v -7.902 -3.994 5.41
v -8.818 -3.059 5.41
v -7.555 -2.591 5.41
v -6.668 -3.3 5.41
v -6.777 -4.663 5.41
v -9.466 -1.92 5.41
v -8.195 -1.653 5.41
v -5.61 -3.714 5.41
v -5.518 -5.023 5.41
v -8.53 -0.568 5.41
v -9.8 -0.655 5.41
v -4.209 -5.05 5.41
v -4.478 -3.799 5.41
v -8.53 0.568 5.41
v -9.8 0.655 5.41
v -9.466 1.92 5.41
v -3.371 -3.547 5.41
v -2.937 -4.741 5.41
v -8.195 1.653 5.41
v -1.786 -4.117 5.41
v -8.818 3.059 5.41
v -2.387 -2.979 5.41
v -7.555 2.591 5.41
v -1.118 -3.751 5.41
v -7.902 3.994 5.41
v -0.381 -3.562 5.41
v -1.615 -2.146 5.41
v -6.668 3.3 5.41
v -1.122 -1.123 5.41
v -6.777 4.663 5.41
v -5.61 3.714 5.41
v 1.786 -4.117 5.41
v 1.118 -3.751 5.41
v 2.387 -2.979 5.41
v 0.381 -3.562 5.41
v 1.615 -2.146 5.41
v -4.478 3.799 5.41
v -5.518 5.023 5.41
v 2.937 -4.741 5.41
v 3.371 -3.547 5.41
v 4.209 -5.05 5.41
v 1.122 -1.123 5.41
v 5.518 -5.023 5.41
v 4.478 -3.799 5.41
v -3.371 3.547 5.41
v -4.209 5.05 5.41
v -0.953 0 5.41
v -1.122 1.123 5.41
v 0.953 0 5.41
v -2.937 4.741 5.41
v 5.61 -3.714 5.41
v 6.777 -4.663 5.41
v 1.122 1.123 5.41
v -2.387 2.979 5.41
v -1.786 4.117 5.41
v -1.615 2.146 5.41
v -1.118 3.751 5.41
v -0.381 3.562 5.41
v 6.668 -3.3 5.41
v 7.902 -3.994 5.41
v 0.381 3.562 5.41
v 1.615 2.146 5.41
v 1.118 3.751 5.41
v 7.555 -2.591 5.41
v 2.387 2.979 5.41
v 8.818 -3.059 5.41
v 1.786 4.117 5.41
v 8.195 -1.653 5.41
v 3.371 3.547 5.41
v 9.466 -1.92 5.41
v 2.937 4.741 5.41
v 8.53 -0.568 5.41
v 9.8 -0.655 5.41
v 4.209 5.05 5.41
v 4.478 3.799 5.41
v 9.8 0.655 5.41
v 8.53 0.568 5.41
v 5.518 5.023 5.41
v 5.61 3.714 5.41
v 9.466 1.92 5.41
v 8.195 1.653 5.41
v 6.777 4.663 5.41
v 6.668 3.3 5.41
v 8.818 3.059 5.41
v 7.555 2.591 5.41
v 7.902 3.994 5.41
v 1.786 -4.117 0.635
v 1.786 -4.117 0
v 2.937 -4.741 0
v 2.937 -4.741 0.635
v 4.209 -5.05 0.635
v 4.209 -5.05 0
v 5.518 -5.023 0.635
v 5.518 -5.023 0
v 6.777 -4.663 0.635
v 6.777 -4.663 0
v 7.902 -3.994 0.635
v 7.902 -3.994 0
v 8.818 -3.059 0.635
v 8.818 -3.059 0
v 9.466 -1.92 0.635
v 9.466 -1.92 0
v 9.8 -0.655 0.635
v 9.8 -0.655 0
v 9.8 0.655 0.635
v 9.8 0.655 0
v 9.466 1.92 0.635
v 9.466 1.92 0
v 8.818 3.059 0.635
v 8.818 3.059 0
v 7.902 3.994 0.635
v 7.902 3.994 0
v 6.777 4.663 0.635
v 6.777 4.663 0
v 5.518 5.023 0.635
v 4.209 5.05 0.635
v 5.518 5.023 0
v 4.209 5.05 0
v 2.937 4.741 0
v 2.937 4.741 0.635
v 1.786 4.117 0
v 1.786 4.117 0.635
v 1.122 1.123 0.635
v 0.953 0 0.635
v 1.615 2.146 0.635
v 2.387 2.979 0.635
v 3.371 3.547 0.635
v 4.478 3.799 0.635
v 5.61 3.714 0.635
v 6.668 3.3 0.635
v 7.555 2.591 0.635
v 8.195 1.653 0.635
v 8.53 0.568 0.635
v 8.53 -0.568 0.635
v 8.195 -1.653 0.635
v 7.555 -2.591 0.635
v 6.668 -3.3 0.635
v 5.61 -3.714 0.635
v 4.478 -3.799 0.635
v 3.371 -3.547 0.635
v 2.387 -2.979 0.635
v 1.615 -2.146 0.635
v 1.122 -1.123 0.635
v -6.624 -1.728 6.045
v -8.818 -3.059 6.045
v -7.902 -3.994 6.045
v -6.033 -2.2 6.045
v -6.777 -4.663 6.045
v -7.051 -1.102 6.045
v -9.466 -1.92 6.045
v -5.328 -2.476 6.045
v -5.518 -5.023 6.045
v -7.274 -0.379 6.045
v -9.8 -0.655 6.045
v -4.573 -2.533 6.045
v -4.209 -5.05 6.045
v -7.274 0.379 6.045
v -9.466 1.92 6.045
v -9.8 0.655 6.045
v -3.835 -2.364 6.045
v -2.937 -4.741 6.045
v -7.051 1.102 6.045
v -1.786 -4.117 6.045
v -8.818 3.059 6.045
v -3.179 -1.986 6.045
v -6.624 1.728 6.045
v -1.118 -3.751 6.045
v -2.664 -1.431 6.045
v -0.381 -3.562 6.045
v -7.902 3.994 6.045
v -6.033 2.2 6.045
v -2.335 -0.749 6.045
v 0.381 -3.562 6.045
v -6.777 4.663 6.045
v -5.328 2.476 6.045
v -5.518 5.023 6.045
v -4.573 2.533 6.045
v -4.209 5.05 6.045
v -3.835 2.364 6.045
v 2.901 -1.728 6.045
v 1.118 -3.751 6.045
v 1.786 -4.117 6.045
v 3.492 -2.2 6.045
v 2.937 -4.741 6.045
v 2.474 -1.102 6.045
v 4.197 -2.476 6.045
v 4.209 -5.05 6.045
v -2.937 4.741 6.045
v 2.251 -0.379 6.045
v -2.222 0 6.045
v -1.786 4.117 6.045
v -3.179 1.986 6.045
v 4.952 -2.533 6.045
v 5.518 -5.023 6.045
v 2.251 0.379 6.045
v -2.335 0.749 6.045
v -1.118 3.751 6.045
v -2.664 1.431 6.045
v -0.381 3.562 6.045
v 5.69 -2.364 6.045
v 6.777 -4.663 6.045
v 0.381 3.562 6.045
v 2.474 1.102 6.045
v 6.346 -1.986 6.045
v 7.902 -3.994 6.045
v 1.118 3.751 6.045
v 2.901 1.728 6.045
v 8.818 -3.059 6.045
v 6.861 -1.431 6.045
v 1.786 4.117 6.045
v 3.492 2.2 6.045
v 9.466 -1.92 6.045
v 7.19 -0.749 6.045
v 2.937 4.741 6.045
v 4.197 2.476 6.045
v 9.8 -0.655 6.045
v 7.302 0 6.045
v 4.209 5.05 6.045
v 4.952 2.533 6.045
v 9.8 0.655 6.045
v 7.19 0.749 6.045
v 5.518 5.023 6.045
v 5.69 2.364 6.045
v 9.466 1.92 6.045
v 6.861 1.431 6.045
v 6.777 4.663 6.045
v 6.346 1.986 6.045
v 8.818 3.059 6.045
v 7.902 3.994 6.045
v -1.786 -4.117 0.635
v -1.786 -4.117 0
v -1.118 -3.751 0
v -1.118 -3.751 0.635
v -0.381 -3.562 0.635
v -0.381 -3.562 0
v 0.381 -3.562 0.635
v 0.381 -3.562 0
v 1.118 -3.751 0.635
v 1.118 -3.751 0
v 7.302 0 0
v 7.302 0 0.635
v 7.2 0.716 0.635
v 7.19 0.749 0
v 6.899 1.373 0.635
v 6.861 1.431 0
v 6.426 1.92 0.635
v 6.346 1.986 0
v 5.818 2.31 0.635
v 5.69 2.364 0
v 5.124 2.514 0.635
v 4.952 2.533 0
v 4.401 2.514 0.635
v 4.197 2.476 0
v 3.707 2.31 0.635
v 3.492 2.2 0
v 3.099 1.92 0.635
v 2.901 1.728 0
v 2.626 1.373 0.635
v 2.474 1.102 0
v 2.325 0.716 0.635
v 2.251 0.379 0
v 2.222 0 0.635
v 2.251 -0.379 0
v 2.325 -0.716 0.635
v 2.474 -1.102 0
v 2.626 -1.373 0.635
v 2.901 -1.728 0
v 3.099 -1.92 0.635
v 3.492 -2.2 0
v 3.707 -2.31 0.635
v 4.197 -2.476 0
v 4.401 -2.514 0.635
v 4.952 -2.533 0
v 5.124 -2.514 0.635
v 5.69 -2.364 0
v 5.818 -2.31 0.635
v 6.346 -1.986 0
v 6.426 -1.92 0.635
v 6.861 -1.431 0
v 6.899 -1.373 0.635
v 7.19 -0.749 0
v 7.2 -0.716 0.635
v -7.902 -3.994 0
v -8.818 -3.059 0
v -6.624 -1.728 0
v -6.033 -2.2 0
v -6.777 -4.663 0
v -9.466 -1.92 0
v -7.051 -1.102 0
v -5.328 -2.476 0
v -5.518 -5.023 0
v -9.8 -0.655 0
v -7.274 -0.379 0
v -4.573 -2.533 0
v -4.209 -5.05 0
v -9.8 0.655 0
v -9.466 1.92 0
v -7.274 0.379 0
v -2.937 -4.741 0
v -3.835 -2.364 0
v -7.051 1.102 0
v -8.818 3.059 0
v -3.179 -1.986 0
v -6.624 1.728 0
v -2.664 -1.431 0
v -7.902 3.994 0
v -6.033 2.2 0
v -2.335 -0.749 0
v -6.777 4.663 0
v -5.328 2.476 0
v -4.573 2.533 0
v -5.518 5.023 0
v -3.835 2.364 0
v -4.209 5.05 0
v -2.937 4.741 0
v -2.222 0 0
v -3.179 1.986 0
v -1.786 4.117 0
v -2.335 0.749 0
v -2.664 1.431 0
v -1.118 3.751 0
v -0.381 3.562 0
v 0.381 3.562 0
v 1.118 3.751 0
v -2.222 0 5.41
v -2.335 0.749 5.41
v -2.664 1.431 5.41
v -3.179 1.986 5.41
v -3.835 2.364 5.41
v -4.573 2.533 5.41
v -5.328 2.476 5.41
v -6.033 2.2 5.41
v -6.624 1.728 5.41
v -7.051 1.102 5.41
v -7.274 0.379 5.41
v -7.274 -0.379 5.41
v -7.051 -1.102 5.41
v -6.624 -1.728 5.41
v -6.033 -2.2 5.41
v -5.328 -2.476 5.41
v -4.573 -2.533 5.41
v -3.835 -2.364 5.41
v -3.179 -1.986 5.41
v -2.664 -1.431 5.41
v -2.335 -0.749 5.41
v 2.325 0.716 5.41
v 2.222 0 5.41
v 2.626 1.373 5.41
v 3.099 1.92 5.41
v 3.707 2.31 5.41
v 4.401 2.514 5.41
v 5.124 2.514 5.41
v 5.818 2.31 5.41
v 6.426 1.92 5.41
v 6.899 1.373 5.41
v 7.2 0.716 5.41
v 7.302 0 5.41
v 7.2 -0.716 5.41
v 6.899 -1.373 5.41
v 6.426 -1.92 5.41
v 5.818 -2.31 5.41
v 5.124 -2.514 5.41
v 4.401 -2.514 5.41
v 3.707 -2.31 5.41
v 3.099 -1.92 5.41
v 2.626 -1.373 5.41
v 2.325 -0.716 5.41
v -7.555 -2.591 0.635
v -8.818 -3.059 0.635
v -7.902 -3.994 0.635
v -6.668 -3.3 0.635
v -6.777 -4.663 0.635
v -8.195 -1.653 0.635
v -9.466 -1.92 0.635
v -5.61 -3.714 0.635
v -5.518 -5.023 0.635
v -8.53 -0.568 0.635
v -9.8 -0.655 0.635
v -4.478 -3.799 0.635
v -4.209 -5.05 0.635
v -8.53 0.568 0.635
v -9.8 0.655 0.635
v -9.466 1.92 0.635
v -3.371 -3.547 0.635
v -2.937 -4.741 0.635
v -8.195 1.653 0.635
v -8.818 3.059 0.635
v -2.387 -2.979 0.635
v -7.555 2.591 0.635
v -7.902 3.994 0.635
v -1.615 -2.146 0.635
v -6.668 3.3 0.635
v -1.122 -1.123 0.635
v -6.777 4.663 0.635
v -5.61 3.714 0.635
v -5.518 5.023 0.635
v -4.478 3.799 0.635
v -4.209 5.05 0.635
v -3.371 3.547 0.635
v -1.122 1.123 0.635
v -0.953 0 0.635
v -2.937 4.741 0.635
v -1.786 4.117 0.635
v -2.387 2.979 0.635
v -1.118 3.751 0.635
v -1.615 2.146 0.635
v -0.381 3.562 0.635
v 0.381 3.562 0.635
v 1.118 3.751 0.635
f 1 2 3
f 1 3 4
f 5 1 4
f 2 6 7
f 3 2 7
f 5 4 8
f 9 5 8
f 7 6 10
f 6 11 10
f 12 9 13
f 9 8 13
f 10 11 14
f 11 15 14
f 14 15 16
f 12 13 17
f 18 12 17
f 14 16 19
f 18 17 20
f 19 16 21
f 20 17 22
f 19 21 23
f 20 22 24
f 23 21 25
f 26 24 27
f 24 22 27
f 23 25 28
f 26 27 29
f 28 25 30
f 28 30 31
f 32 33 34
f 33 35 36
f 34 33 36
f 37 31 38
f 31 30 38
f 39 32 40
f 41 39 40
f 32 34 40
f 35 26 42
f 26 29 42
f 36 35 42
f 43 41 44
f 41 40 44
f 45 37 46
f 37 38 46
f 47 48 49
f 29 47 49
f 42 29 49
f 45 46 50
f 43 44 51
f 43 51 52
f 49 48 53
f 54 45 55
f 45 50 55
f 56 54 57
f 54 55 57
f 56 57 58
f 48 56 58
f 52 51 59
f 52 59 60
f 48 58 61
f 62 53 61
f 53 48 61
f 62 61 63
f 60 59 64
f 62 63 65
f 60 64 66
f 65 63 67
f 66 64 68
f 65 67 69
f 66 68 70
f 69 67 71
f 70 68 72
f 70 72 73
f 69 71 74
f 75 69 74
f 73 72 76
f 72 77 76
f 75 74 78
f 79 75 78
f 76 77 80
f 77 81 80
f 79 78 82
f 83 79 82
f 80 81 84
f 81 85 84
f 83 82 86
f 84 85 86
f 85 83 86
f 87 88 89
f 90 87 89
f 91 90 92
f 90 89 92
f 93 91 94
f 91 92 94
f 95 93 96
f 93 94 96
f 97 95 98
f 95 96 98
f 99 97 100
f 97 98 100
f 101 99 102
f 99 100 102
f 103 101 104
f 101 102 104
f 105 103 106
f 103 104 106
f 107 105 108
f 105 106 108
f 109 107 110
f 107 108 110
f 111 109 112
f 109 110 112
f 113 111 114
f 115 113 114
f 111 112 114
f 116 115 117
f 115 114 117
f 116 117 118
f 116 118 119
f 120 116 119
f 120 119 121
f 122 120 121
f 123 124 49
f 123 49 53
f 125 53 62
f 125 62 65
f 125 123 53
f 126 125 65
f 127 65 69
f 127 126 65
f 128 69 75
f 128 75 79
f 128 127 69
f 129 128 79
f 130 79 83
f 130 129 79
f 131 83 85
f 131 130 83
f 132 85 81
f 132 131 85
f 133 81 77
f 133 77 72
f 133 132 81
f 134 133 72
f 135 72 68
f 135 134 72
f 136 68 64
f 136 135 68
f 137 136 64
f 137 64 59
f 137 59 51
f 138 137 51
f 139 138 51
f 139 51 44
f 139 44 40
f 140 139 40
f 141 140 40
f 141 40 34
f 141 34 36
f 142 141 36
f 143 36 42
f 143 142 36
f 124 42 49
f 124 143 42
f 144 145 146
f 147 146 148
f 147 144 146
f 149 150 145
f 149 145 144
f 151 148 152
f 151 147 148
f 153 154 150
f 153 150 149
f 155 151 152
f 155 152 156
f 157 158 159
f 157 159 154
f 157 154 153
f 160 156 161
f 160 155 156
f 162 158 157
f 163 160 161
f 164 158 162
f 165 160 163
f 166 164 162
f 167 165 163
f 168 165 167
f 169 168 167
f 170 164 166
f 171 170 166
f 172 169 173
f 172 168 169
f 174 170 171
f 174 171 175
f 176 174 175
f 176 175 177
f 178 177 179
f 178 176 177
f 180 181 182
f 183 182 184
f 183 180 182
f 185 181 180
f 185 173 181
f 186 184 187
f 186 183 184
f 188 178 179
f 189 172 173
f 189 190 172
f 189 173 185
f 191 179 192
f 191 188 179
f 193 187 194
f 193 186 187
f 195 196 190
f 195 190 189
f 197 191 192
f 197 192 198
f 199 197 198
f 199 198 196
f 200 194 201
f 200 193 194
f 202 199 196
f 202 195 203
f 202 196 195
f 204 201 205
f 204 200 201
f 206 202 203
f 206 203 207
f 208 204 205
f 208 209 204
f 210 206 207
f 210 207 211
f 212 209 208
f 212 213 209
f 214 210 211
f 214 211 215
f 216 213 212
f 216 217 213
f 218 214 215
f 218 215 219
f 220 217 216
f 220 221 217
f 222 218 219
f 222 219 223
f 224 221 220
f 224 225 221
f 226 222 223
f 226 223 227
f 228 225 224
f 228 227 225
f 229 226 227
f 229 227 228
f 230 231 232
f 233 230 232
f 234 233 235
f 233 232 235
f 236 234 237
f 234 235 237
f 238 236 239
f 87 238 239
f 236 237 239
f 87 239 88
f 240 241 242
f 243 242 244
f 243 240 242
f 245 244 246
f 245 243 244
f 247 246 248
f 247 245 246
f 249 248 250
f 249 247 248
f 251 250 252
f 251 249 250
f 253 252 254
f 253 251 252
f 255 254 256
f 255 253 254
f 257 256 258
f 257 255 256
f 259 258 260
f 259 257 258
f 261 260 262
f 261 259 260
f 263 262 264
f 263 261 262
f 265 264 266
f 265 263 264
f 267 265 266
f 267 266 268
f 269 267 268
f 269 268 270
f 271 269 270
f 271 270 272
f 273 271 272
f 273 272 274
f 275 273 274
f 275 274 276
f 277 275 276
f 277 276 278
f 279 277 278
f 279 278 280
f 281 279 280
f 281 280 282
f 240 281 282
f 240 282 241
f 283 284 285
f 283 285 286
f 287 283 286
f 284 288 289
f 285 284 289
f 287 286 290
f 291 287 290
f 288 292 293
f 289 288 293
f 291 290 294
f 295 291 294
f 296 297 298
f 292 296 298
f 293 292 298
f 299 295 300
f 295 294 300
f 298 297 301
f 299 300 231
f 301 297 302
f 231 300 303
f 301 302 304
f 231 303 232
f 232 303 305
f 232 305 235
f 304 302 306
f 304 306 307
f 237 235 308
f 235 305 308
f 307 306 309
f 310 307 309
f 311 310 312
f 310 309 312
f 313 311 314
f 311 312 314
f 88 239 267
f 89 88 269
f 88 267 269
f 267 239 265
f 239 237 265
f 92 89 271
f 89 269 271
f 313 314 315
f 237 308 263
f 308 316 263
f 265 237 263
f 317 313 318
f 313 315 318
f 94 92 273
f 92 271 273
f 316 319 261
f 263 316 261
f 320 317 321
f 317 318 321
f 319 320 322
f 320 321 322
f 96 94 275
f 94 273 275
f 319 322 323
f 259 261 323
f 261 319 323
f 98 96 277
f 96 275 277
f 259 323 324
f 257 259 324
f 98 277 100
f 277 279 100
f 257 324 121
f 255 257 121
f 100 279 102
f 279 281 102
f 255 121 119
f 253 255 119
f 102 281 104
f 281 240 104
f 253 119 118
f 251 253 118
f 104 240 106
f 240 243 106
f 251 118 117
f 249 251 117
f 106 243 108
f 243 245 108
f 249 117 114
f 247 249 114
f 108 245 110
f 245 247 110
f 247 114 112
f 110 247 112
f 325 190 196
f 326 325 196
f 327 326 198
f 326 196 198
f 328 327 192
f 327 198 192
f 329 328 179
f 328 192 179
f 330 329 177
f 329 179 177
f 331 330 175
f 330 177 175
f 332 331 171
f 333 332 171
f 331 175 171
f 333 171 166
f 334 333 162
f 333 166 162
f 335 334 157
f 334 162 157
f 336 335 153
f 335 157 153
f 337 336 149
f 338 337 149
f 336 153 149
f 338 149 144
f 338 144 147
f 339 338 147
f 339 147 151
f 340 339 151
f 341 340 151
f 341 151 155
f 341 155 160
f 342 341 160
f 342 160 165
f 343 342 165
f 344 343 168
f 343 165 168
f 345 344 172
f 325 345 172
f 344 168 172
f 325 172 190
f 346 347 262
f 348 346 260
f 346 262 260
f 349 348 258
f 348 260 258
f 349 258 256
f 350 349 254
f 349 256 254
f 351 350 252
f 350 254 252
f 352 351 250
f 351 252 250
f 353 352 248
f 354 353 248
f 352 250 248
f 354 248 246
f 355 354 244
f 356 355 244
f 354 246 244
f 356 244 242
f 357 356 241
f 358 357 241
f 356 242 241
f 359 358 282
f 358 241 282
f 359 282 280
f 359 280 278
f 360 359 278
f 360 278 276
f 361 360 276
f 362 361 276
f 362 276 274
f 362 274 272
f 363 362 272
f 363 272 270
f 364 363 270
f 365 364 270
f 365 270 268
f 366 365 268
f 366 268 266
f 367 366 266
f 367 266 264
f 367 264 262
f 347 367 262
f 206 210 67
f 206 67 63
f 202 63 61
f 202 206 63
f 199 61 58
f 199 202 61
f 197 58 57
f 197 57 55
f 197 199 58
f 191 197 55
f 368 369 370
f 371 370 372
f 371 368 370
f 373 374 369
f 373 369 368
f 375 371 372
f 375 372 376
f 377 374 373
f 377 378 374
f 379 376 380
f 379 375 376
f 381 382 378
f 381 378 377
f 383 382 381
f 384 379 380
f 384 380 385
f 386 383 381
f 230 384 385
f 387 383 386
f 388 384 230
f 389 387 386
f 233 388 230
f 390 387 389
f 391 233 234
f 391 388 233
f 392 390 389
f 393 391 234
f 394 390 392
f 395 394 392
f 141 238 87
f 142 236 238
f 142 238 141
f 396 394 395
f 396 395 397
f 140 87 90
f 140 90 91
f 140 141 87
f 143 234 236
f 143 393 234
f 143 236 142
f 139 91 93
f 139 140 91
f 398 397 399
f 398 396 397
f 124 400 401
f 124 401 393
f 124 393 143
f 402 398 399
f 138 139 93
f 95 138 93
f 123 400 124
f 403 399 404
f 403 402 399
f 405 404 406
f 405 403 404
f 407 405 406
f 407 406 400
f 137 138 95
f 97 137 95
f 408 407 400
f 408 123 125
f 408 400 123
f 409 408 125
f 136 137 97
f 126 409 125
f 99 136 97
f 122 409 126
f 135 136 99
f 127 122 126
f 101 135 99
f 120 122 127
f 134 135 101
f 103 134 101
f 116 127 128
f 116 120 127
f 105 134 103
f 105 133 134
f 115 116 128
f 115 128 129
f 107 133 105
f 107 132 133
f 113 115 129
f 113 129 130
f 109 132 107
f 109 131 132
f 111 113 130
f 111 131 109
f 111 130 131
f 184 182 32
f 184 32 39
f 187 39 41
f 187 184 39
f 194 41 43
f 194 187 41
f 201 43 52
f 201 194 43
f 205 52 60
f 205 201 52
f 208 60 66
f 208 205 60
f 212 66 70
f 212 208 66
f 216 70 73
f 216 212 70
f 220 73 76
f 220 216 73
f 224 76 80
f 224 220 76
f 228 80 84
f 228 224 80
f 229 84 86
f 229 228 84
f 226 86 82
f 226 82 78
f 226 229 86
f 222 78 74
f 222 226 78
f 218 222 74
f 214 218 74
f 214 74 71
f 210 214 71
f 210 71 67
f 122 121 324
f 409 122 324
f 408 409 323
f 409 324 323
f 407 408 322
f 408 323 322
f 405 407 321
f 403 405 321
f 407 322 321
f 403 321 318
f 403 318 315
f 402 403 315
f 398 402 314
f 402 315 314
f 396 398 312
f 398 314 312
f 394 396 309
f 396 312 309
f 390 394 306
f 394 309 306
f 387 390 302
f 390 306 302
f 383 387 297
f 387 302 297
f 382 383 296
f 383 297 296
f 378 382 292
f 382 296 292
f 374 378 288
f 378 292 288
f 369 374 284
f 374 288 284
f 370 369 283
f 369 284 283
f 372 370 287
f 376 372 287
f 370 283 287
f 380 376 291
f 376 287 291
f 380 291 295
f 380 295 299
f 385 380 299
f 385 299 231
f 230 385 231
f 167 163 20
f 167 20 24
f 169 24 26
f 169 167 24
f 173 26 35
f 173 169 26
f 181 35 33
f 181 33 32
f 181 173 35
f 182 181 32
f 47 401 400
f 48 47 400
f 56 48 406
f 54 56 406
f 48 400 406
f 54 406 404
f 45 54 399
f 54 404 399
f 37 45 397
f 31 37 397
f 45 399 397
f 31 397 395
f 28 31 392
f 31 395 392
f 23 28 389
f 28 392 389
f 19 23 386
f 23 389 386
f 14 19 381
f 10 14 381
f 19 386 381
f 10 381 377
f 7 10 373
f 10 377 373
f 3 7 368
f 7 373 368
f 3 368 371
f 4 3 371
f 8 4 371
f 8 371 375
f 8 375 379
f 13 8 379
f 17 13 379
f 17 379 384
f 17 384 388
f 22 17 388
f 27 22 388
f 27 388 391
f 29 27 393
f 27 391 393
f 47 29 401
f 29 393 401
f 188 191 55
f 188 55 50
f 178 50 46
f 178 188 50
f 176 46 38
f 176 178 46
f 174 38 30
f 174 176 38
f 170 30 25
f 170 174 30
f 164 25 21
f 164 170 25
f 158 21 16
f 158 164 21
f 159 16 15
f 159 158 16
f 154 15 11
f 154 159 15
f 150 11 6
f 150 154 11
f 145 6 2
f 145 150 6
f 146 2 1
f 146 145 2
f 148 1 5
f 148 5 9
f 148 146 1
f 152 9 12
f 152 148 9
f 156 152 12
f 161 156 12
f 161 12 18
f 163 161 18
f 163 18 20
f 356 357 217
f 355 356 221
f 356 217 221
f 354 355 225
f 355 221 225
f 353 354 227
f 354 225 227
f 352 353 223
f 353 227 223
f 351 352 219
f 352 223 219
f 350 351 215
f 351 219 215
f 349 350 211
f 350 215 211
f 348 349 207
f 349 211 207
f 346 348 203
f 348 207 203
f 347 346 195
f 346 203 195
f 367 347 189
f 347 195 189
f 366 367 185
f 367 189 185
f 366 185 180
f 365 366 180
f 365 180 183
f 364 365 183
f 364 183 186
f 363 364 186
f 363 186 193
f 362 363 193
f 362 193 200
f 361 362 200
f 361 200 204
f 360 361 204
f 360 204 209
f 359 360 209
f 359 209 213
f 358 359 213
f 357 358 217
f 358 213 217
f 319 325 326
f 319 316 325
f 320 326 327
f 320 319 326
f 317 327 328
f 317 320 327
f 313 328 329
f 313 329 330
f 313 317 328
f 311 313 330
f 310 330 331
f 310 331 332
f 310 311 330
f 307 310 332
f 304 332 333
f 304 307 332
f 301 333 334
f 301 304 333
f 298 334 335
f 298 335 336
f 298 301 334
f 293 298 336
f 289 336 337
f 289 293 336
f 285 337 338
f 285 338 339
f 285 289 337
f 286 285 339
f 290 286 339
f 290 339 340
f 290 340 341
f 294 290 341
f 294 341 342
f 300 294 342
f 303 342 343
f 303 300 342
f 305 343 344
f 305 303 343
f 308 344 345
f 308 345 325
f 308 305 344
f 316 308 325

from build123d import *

# Parameters (mm, degrees)
SKETCH1_R           = 2.54
BOSS_EXTRUDE1_DEPTH = 0.635
SKETCH2_R           = 3.81
SKETCH2_R_2         = 2.54
BOSS_EXTRUDE2_DEPTH = 4.7752


with BuildPart() as part:
    # Sketch1 → Boss-Extrude1 (new body)
    with BuildSketch(Plane.XY):
        with BuildLine():
            ThreePointArc((-1.7859375, 4.116609732), (-9.8425, 0), (-1.7859375, -4.116609732))
            ThreePointArc((-1.7859375, -4.116609732), (0, -3.538575571), (1.7859375, -4.116609732))
            ThreePointArc((1.7859375, -4.116609732), (9.8425, 0), (1.7859375, 4.116609732))
            ThreePointArc((1.7859375, 4.116609732), (0, 3.538575571), (-1.7859375, 4.116609732))
        make_face()
        with Locations((-4.7625, 0)):
            Circle(SKETCH1_R, mode=Mode.SUBTRACT)
        with Locations((4.7625, 0)):
            Circle(SKETCH1_R, mode=Mode.SUBTRACT)
    boss_extrude1 = extrude(amount=BOSS_EXTRUDE1_DEPTH)

    # Sketch2 → Boss-Extrude2 (add)
    with BuildSketch(Plane.XY.offset(0.635)):
        with Locations((-4.7625, 0)):
            Circle(SKETCH2_R)
        with Locations((-4.7625, 0)):
            Circle(SKETCH2_R_2, mode=Mode.SUBTRACT)
    boss_extrude2 = extrude(amount=BOSS_EXTRUDE2_DEPTH)

    # Mirror1: Boss-Extrude2 across plane
    add(boss_extrude2.mirror(Plane(origin=(0, 0, 0), x_dir=(0, 0, 1), z_dir=(1, 0, 0))))

    # Mirror2: Boss-Extrude1 across plane
    add(boss_extrude1.mirror(Plane.XY.offset(3.0226)))


solid = part.part
